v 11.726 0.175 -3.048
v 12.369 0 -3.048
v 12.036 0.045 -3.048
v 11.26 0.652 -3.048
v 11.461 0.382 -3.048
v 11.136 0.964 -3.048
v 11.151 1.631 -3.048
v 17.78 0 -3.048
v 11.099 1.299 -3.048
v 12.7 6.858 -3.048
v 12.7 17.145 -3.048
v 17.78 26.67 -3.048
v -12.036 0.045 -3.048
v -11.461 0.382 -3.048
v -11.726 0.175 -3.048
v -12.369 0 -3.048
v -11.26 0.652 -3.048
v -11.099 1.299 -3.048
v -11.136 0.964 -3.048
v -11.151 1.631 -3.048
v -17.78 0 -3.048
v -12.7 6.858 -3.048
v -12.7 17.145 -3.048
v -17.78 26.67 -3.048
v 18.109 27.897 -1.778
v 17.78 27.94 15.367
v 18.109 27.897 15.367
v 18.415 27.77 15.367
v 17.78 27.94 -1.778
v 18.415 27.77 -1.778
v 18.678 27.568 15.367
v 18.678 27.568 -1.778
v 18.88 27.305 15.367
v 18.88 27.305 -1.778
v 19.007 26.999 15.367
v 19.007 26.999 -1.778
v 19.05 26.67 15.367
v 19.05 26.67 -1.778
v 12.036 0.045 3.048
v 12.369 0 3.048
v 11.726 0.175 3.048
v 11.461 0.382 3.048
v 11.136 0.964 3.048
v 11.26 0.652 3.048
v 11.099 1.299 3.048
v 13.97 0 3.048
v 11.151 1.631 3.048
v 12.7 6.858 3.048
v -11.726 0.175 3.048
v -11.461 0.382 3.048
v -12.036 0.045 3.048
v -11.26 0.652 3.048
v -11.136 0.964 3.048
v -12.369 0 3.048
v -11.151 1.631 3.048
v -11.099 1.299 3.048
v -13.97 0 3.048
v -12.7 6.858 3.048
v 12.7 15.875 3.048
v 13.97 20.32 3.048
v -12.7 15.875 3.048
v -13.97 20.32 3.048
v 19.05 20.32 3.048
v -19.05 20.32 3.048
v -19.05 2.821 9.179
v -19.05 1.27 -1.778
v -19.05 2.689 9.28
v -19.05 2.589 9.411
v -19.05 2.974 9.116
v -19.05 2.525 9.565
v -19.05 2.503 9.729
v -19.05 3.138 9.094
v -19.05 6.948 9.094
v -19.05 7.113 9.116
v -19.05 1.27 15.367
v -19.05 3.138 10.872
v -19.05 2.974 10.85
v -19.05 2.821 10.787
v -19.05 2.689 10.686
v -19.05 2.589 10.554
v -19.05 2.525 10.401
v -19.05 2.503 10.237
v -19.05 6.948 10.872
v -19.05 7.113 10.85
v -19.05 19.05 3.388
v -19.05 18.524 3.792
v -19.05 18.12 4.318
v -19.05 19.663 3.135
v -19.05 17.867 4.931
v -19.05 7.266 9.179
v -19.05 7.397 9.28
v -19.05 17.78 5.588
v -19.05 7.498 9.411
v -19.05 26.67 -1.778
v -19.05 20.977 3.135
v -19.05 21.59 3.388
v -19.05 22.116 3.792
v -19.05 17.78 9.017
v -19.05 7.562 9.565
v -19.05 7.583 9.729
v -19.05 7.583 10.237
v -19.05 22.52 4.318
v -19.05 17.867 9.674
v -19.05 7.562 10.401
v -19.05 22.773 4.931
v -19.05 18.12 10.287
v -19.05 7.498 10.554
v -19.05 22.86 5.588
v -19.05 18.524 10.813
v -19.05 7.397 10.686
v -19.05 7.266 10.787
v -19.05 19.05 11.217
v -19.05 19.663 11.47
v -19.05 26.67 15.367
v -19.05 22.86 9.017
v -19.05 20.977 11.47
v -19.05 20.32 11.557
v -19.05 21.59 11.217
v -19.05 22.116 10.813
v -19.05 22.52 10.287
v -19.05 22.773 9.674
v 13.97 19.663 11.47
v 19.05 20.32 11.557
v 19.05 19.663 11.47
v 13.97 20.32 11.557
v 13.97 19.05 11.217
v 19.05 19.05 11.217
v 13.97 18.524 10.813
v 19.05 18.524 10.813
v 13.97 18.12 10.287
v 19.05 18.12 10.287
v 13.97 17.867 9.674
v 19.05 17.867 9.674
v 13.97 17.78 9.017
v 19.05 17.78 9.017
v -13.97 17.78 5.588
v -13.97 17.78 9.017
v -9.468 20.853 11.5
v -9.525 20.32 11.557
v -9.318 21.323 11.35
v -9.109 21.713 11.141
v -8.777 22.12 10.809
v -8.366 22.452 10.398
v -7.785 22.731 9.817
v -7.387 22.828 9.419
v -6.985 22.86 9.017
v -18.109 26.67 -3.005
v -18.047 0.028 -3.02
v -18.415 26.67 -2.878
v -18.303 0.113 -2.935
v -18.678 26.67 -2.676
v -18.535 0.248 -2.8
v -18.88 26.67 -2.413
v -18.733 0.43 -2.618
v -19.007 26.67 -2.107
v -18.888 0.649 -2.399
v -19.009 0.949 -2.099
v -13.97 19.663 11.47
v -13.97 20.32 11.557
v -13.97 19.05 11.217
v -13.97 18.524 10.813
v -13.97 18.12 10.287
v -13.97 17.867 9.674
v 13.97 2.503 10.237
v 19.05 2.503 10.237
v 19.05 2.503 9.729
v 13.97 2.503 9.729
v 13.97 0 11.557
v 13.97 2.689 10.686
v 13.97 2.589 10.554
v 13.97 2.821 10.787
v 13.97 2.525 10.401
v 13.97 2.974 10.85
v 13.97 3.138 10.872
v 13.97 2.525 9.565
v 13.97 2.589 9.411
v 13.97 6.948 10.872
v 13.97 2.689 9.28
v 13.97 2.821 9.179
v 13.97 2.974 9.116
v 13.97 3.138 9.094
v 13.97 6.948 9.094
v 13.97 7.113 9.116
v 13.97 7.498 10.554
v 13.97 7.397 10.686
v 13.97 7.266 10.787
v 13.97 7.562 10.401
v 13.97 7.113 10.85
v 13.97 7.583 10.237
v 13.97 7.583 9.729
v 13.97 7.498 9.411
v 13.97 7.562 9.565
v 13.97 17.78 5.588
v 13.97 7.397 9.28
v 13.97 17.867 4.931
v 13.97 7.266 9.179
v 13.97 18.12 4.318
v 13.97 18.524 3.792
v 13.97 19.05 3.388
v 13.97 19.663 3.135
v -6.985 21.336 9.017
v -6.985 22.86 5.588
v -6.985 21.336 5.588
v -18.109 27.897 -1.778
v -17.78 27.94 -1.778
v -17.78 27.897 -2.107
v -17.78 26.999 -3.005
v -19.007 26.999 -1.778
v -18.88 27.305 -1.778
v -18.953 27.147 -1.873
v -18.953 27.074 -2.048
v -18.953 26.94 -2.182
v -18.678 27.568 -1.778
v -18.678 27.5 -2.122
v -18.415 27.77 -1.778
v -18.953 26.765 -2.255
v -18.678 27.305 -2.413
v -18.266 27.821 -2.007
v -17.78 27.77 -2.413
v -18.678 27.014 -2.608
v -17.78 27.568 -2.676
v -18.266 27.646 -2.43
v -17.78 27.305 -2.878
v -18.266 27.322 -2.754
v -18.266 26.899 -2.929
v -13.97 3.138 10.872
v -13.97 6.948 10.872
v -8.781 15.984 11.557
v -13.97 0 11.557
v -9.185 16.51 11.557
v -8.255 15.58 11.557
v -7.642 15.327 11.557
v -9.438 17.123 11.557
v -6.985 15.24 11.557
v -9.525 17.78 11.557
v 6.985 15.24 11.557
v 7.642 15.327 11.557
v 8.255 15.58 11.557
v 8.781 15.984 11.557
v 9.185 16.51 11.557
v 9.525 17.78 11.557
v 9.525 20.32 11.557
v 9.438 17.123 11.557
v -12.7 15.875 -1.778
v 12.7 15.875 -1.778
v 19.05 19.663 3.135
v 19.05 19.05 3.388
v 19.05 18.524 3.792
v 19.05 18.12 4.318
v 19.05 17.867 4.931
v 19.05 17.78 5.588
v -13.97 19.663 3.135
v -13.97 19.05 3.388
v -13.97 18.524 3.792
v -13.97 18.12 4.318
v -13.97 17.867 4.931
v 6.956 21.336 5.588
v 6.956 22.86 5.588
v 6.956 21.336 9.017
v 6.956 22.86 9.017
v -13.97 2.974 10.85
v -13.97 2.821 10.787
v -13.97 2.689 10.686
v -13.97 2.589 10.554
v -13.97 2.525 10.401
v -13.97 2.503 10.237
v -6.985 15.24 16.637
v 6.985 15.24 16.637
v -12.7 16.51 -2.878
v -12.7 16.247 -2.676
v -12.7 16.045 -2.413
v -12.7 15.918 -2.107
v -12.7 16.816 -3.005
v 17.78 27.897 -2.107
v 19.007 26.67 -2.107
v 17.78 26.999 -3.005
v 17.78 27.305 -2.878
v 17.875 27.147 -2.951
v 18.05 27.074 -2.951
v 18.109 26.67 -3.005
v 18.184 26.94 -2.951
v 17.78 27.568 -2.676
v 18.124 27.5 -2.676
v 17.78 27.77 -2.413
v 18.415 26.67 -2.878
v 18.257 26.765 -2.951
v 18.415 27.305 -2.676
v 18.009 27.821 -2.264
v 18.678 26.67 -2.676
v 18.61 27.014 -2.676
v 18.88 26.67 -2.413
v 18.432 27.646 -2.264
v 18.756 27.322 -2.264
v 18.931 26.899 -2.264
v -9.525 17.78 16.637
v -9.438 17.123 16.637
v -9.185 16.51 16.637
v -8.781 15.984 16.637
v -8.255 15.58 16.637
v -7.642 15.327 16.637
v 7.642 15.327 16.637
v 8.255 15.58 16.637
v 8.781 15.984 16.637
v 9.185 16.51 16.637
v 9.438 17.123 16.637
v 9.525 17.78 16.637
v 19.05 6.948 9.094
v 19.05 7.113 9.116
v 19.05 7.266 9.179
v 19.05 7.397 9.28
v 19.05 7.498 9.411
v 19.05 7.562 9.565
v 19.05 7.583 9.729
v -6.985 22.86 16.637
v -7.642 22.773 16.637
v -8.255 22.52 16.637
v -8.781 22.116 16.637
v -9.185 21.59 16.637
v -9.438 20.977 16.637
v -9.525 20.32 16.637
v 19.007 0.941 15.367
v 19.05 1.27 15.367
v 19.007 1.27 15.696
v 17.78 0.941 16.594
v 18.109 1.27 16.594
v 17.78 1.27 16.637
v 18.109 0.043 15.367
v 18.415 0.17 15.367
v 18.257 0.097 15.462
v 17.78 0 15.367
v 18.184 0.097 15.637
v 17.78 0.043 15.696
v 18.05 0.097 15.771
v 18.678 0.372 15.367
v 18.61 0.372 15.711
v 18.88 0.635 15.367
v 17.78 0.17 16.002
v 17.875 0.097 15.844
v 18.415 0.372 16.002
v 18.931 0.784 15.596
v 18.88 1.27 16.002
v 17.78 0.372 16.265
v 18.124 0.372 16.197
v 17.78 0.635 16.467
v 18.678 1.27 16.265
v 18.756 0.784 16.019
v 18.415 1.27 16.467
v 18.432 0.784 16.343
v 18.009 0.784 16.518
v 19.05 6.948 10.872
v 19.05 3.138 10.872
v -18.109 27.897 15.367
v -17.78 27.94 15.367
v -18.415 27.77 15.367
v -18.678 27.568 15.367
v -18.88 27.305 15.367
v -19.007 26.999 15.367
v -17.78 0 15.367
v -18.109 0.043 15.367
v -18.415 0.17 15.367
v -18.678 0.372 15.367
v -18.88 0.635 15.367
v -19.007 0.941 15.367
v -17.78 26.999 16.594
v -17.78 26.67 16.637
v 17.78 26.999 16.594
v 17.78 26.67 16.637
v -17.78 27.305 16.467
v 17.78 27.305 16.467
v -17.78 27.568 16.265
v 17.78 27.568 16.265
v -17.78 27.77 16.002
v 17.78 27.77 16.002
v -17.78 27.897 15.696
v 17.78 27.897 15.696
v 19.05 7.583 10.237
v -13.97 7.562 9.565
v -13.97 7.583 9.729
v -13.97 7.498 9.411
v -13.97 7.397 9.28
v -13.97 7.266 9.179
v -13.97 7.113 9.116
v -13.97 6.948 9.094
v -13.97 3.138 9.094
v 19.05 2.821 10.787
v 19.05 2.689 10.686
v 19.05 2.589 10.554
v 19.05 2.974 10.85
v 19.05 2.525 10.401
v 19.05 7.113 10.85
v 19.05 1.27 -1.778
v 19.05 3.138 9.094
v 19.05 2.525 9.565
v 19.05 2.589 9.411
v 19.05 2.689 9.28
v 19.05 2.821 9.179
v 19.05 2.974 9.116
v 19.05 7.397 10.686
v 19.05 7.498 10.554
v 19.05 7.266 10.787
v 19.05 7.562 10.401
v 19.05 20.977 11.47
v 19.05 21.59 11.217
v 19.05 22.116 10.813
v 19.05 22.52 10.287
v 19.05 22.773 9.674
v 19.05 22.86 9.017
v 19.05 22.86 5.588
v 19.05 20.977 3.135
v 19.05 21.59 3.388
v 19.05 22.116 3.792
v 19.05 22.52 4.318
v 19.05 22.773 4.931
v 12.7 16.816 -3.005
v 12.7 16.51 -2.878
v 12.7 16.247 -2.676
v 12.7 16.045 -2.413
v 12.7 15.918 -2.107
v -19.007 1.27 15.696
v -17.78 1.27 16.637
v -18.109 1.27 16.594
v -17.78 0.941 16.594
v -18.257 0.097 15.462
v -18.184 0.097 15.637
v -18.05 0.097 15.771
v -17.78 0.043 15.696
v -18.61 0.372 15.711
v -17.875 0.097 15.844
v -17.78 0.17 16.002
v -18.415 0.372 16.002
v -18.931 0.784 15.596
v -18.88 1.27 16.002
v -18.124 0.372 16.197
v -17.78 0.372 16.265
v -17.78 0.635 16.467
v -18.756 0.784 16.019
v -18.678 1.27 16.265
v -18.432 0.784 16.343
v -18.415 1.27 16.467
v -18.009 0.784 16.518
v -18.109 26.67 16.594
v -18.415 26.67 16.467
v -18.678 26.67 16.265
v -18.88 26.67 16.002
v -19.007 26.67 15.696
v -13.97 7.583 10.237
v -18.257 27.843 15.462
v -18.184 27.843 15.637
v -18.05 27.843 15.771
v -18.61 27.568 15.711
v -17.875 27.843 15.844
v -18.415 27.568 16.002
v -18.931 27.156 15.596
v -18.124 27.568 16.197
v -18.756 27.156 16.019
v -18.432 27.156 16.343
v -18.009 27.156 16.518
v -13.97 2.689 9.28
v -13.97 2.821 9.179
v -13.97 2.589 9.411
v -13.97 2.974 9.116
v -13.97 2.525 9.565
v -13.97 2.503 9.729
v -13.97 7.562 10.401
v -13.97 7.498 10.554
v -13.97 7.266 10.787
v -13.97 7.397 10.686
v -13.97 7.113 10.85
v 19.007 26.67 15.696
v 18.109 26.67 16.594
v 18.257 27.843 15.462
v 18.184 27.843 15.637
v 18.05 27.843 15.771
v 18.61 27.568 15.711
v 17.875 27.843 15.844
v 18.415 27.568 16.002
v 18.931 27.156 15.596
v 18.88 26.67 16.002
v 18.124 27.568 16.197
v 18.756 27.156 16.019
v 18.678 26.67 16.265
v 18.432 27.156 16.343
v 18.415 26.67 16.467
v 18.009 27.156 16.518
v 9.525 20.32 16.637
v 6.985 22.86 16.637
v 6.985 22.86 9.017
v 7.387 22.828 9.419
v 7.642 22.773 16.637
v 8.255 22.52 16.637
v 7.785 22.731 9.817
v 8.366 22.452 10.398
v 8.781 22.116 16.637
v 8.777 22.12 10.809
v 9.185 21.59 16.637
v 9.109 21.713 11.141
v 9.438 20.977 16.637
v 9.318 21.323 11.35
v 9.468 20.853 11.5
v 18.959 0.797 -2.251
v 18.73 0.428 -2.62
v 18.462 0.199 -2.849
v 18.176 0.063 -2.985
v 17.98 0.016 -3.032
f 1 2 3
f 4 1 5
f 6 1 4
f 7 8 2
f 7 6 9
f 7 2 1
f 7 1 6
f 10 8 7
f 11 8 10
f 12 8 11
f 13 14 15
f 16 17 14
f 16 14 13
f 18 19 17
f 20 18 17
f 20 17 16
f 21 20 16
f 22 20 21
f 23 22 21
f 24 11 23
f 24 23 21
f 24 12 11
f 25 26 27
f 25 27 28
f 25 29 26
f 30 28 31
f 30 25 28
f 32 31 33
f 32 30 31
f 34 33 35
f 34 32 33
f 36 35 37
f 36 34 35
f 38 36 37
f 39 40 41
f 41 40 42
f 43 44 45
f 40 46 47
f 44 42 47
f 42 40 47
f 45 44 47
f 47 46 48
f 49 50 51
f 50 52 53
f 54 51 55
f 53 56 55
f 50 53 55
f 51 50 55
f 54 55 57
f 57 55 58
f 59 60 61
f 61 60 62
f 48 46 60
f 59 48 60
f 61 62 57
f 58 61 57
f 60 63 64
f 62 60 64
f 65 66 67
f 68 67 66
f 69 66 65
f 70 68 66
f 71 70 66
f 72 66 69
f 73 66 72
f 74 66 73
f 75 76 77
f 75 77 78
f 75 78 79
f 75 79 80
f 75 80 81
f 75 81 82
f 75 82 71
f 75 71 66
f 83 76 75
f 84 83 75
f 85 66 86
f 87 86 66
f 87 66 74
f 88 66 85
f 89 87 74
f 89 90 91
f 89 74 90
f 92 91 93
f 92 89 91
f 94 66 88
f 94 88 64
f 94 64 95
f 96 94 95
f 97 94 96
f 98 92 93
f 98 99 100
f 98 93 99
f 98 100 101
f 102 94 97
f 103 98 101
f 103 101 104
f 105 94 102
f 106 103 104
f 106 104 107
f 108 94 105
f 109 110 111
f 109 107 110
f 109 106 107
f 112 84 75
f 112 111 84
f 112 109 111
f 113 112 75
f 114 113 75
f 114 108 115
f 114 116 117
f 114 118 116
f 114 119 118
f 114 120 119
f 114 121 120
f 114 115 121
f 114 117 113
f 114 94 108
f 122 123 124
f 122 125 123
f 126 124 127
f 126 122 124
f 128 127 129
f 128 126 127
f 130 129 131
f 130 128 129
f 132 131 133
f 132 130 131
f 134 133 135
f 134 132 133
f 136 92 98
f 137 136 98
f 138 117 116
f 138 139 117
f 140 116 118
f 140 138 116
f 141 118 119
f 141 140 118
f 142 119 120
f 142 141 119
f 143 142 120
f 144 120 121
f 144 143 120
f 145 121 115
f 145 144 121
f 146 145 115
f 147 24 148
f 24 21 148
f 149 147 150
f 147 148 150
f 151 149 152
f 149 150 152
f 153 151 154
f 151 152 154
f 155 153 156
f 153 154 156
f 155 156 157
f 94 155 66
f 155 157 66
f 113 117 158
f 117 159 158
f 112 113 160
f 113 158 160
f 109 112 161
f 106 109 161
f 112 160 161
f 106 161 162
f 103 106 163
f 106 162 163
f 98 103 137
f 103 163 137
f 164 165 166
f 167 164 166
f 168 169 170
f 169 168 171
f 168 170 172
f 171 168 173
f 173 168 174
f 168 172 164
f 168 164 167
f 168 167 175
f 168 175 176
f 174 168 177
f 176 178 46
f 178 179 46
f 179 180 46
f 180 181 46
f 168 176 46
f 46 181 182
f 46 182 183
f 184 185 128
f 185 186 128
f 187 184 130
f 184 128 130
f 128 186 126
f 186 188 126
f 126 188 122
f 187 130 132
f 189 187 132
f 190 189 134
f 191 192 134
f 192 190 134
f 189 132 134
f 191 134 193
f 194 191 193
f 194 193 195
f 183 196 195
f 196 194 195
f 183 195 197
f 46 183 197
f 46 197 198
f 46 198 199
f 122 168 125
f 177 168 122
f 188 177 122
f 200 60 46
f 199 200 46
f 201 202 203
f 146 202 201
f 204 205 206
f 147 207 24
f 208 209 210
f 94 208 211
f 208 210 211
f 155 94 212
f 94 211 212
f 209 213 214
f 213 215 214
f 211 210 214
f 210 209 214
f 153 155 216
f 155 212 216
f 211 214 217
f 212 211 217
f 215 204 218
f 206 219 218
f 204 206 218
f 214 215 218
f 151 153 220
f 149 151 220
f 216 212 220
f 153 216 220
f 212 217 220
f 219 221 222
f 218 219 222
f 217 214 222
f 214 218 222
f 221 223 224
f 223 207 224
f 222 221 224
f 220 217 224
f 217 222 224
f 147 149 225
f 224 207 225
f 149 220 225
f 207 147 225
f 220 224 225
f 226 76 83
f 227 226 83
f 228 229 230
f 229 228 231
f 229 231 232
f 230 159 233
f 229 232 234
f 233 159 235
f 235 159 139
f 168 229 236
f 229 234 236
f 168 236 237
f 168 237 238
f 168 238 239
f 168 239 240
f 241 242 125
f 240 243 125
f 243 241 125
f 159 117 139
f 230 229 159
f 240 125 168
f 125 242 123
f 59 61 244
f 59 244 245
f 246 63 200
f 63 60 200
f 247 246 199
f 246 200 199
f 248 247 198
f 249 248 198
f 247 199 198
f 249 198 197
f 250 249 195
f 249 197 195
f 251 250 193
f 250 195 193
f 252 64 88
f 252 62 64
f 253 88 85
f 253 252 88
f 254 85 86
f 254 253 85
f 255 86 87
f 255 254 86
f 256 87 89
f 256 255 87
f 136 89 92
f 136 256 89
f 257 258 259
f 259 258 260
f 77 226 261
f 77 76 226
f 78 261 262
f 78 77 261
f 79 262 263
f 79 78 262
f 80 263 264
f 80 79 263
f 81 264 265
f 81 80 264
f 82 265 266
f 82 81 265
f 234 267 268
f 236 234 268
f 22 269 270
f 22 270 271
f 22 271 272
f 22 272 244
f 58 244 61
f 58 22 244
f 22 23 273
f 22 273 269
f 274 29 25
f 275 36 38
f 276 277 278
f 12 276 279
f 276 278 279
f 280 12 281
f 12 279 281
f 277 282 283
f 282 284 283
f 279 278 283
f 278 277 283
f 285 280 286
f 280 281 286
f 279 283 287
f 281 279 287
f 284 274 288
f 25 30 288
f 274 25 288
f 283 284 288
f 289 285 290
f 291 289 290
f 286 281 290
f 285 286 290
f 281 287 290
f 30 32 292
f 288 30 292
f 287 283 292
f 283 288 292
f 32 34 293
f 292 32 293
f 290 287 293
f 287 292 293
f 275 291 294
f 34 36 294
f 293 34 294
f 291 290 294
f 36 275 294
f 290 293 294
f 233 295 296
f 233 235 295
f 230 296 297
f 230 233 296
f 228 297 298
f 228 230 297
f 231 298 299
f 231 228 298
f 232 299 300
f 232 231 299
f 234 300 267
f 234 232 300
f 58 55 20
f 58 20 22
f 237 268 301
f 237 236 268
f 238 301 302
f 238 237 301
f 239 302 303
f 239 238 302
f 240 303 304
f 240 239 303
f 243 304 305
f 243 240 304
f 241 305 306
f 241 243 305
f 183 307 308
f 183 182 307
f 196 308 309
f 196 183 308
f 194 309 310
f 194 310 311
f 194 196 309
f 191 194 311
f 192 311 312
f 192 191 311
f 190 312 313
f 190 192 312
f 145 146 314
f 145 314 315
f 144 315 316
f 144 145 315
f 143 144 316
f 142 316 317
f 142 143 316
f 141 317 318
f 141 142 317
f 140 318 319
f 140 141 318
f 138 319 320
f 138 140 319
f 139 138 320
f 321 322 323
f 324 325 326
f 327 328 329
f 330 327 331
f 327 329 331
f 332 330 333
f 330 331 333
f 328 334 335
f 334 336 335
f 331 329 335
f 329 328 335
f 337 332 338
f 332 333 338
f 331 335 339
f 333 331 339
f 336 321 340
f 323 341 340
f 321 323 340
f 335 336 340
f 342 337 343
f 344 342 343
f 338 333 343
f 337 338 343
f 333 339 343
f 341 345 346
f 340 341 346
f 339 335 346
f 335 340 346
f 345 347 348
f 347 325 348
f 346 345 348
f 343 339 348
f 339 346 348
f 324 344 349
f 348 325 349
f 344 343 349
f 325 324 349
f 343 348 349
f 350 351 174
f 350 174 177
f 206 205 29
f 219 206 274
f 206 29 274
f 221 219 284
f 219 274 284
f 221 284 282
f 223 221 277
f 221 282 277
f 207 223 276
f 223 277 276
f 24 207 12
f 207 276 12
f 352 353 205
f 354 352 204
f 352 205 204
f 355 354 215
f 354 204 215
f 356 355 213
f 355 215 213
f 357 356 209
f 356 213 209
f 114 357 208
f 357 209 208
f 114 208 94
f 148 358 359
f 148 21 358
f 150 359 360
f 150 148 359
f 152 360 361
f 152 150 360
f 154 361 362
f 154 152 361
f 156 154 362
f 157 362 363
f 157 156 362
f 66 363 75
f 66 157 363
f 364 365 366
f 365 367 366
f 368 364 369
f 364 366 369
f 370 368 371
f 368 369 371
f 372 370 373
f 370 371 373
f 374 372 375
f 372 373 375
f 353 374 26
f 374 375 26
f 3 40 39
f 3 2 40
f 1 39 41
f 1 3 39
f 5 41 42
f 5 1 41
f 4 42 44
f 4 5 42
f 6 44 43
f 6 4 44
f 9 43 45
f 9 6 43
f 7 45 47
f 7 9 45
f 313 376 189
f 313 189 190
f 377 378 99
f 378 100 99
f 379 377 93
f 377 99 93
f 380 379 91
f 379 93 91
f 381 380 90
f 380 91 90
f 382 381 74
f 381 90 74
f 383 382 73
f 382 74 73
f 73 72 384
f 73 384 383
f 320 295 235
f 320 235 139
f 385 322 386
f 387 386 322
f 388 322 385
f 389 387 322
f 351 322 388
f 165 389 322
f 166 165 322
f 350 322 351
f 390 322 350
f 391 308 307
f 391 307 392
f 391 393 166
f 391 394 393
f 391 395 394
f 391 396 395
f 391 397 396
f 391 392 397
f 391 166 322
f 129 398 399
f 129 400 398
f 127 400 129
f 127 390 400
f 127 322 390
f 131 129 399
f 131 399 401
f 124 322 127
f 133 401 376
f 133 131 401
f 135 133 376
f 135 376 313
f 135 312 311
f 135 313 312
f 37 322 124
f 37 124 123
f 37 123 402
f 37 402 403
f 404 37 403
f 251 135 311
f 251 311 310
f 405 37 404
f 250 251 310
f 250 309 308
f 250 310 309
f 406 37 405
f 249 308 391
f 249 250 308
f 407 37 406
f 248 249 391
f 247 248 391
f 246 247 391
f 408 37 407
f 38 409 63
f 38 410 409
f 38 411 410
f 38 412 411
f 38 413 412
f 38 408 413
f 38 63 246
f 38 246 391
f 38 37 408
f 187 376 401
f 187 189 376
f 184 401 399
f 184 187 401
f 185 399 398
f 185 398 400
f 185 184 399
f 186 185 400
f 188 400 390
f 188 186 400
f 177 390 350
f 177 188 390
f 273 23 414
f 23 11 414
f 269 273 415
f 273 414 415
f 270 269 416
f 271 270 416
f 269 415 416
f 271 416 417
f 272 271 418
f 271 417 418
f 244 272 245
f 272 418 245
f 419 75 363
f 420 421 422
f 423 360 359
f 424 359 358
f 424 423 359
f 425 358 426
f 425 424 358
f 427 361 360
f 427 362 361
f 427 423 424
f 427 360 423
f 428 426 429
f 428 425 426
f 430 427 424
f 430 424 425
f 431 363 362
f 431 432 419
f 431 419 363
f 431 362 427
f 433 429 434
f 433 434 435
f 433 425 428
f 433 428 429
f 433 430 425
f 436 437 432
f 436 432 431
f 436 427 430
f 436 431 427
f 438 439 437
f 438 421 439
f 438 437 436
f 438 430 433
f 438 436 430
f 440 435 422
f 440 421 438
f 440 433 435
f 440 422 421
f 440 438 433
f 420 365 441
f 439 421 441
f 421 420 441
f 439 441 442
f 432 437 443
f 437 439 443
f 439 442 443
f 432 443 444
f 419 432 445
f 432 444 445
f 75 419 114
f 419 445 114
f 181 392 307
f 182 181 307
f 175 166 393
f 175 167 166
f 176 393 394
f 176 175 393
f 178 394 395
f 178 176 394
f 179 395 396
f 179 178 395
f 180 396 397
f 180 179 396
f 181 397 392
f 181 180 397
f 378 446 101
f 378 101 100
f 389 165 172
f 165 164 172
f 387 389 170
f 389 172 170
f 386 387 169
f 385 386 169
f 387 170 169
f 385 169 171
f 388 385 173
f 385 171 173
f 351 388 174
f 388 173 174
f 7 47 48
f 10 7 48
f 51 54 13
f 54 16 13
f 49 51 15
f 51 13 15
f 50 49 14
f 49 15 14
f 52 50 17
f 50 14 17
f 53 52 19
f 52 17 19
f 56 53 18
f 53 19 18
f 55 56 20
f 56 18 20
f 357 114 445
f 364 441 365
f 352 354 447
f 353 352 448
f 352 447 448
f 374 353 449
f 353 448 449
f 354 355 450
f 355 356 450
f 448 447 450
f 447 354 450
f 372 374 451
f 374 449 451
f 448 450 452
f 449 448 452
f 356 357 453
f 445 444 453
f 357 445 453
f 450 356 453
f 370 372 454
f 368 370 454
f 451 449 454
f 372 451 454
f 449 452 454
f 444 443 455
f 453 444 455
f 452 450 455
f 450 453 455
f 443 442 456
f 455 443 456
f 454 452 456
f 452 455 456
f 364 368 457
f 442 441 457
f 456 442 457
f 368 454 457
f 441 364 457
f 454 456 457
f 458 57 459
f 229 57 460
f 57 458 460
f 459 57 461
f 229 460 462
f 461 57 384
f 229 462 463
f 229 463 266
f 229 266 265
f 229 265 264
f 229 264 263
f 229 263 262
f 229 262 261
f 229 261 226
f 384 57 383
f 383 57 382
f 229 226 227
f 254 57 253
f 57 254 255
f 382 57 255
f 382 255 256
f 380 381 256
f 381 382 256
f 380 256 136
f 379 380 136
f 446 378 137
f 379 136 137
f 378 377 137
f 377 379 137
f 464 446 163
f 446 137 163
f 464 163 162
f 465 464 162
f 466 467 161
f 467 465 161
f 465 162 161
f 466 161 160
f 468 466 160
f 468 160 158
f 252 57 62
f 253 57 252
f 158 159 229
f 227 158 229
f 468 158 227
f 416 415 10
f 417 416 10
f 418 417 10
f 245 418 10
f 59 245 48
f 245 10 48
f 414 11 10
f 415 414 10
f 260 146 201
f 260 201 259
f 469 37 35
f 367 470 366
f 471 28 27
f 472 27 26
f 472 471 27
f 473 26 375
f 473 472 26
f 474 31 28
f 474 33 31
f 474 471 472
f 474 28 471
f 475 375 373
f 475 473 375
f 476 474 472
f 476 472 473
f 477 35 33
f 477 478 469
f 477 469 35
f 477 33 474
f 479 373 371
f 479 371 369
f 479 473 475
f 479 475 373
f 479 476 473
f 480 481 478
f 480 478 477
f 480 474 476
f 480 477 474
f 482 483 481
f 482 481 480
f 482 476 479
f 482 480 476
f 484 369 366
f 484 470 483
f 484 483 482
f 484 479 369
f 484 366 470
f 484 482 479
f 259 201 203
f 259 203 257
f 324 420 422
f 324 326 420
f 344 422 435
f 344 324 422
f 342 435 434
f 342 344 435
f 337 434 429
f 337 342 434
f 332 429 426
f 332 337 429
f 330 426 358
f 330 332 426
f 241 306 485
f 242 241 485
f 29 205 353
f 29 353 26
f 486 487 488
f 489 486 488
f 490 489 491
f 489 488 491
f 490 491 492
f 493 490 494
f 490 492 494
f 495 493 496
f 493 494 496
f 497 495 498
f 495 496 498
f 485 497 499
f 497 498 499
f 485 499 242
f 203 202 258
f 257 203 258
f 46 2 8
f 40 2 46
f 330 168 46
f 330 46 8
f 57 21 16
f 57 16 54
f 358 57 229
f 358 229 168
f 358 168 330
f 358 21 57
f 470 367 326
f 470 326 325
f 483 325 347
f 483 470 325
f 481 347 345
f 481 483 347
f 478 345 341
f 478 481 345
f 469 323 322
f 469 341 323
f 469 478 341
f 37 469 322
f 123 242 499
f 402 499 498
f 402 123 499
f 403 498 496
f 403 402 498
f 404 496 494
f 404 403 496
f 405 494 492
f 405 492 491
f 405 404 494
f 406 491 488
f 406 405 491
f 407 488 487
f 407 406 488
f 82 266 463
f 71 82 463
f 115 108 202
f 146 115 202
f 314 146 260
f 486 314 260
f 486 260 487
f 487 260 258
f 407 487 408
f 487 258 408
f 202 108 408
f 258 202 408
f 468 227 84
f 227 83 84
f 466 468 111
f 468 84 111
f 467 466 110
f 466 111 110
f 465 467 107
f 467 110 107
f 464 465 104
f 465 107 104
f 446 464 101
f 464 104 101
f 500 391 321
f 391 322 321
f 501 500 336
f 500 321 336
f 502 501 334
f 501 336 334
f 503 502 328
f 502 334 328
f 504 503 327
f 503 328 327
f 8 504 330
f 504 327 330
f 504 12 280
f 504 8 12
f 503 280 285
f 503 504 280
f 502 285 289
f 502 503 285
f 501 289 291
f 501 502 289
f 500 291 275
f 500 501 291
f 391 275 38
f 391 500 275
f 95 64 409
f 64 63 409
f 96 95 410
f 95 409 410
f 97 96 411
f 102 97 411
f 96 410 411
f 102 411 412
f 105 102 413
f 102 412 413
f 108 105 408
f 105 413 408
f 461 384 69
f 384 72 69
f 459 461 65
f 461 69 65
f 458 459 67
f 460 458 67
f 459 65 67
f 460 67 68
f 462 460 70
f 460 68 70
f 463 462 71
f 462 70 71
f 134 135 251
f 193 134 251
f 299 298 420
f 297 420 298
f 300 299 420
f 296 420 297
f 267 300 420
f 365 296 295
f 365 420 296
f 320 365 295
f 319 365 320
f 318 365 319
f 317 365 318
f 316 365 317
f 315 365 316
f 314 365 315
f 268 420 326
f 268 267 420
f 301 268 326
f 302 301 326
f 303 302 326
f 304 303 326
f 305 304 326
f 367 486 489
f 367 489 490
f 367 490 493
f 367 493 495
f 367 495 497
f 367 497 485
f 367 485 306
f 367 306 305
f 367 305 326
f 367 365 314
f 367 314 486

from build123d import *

# Parameters (mm, degrees)
SKETCH1_W           = 38.1
SKETCH1_H           = 6.096
BOSS_EXTRUDE1_DEPTH = 22.86
SKETCH4_W           = 25.4
SKETCH4_H           = 6.096
CUT_EXTRUDE1_DEPTH  = 15.875
FILLET1_R           = 1.27
SKETCH5_W           = 38.1
SKETCH5_H           = 19.685
BOSS_EXTRUDE2_DEPTH = 5.08
BOSS_EXTRUDE3_DEPTH = 6.096
BOSS_EXTRUDE4_DEPTH = 6.096
FILLET2_R           = 1.27
SKETCH9_W           = 38.1
SKETCH9_H           = 5.08
BOSS_EXTRUDE5_DEPTH = 22.86
SKETCH10_W          = 8.509
SKETCH10_H          = 17.78
BOSS_EXTRUDE6_DEPTH = 5.08
SKETCH11_W          = 8.509
SKETCH11_H          = 17.78
BOSS_EXTRUDE7_DEPTH = 5.08
SKETCH12_W          = 19.05
SKETCH12_H          = 7.62
CUT_EXTRUDE2_DEPTH  = 5.08
FILLET3_R           = 2.54
FILLET5_R           = 2.54
FILLET6_R           = 1.27
SKETCH13_W          = 13.940844751
SKETCH13_H          = 3.429
BOSS_EXTRUDE8_DEPTH = 1.524
CUT_EXTRUDE5_REACH  = 52.09
SKETCH22_W          = 1.778
SKETCH22_H          = 5.08
FILLET7_R           = 0.635


with BuildPart() as part:
    # Sketch1 → Boss-Extrude1 (new body)
    with BuildSketch(Plane(origin=(0, 0, 0), x_dir=(1, 0, 0), z_dir=(0, 1, 0))):
        Rectangle(SKETCH1_W, SKETCH1_H)
    extrude(amount=BOSS_EXTRUDE1_DEPTH)

    # Sketch4 → Cut-Extrude1 (cut)
    with BuildSketch(Plane.XZ):
        Rectangle(SKETCH4_W, SKETCH4_H)
    extrude(amount=-CUT_EXTRUDE1_DEPTH, mode=Mode.SUBTRACT)

    # Fillet1
    fillet1_edges = [part.edges().sort_by_distance(p)[0] for p in [
        (0, 15.875, -3.048),
    ]]
    fillet(fillet1_edges, radius=FILLET1_R)

    # Sketch5 → Boss-Extrude2 (add)
    with BuildSketch(Plane(origin=(0, 22.86, 0), x_dir=(1, 0, 0), z_dir=(0, 1, 0))):
        with Locations((0, -6.7945)):
            Rectangle(SKETCH5_W, SKETCH5_H)
    extrude(amount=BOSS_EXTRUDE2_DEPTH)

    # Sketch6 → Boss-Extrude3 (add)
    with BuildSketch(Plane.XY.offset(3.048)):
        Polygon((-12.7, 0), (-10.668, 0), (-12.7, 6.858), align=None)
    extrude(amount=-BOSS_EXTRUDE3_DEPTH)

    # Sketch7 → Boss-Extrude4 (add)
    with BuildSketch(Plane.XY.offset(3.048)):
        Polygon((12.7, 0), (10.668, 0), (12.7, 6.858), align=None)
    extrude(amount=-BOSS_EXTRUDE4_DEPTH)

    # Fillet2
    fillet2_edges = [part.edges().sort_by_distance(p)[0] for p in [
        (-10.668, 0, 0),
        (10.668, 0, 0),
    ]]
    fillet(fillet2_edges, radius=FILLET2_R)

    # Sketch9 → Boss-Extrude5 (add)
    with BuildSketch(Plane.XZ.offset(-22.86)):
        with Locations((0, 14.097)):
            Rectangle(SKETCH9_W, SKETCH9_H)
    extrude(amount=BOSS_EXTRUDE5_DEPTH)

    # Sketch10 → Boss-Extrude6 (add)
    with BuildSketch(Plane(origin=(19.05, 0, 0), x_dir=(0, 0, -1), z_dir=(1, 0, 0))):
        with Locations((-7.3025, 8.89)):
            Rectangle(SKETCH10_W, SKETCH10_H)
    extrude(amount=-BOSS_EXTRUDE6_DEPTH)

    # Sketch11 → Boss-Extrude7 (add)
    with BuildSketch(Plane.ZY.offset(19.05)):
        with Locations((7.3025, 8.89)):
            Rectangle(SKETCH11_W, SKETCH11_H)
    extrude(amount=-BOSS_EXTRUDE7_DEPTH)

    # Sketch12 → Cut-Extrude2 (cut)
    with BuildSketch(Plane.XY.offset(16.637)):
        with Locations((0, 19.05)):
            Rectangle(SKETCH12_W, SKETCH12_H)
    extrude(amount=-CUT_EXTRUDE2_DEPTH, mode=Mode.SUBTRACT)

    # Fillet3
    fillet3_edges = [part.edges().sort_by_distance(p)[0] for p in [
        (9.525, 22.86, 14.097),
        (9.525, 15.24, 14.097),
        (-9.525, 15.24, 14.097),
        (-9.525, 22.86, 14.097),
    ]]
    fillet(fillet3_edges, radius=FILLET3_R)

    # Fillet5
    fillet5_edges = [part.edges().sort_by_distance(p)[0] for p in [
        (13.0175, 22.86, 11.557),
        (16.51, 17.78, 11.557),
        (16.51, 17.78, 3.048),
        (0, 22.86, 3.048),
        (-13.0175, 22.86, 11.557),
        (-16.51, 17.78, 11.557),
        (-16.51, 17.78, 3.048),
    ]]
    fillet(fillet5_edges, radius=FILLET5_R - 0.0001)  # a hair under: the kernel refuses the full size

    # Fillet6
    fillet6_edges = [part.edges().sort_by_distance(p)[0] for p in [
        (19.05, 13.97, 16.637),
        (-19.05, 13.97, 16.637),
        (19.05, 27.94, 6.7945),
        (0, 27.94, -3.048),
        (-19.05, 27.94, 6.7945),
        (0, 27.94, 16.637),
        (-19.05, 0, 6.7945),
        (19.05, 0, 6.7945),
        (-19.05, 13.97, -3.048),
        (19.05, 13.97, -3.048),
        (0, 0, 16.637),
    ]]
    fillet(fillet6_edges, radius=FILLET6_R)

    # Sketch13 → Boss-Extrude8 (add)
    with BuildSketch(Plane.XZ.offset(-22.86)):
        with Locations((-0.014577624, 7.3025)):
            Rectangle(SKETCH13_W, SKETCH13_H)
    extrude(amount=BOSS_EXTRUDE8_DEPTH)

    # Cut-Extrude5: up to this face of the body (flat: up to its plane)
    cut_extrude5_end = Plane(part.part.faces().sort_by_distance((-19.05, 13.368385641, 6.746370851))[0])
    # Sketch22 → Cut-Extrude5 (cut, up to the picked face)
    with BuildSketch(Plane(origin=(19.05, 0, 0), x_dir=(0, 0, -1), z_dir=(1, 0, 0)), mode=Mode.PRIVATE) as cut_extrude5_sk1:
        with Locations((-9.982963742, 5.043439789)):
            Rectangle(SKETCH22_W, SKETCH22_H)
    cut_extrude5_tool1 = split(extrude(cut_extrude5_sk1.sketch, amount=-CUT_EXTRUDE5_REACH, mode=Mode.PRIVATE), bisect_by=cut_extrude5_end, keep=Keep.BOTH, mode=Mode.PRIVATE)
    add(cut_extrude5_tool1.solids().sort_by(Axis((19.05, 5.04344, 9.982964), (-1, 0, 0)))[0], mode=Mode.SUBTRACT)

    # Fillet7
    fillet7_edges = [part.edges().sort_by_distance(p)[0] for p in [
        (16.51, 2.503439789, 10.871963742),
        (16.51, 7.583439789, 10.871963742),
        (16.51, 7.583439789, 9.093963742),
        (16.51, 2.503439789, 9.093963742),
        (-16.51, 2.503439789, 10.871963742),
        (-16.51, 7.583439789, 10.871963742),
        (-16.51, 7.583439789, 9.093963742),
        (-16.51, 2.503439789, 9.093963742),
    ]]
    fillet(fillet7_edges, radius=FILLET7_R)


solid = part.part
